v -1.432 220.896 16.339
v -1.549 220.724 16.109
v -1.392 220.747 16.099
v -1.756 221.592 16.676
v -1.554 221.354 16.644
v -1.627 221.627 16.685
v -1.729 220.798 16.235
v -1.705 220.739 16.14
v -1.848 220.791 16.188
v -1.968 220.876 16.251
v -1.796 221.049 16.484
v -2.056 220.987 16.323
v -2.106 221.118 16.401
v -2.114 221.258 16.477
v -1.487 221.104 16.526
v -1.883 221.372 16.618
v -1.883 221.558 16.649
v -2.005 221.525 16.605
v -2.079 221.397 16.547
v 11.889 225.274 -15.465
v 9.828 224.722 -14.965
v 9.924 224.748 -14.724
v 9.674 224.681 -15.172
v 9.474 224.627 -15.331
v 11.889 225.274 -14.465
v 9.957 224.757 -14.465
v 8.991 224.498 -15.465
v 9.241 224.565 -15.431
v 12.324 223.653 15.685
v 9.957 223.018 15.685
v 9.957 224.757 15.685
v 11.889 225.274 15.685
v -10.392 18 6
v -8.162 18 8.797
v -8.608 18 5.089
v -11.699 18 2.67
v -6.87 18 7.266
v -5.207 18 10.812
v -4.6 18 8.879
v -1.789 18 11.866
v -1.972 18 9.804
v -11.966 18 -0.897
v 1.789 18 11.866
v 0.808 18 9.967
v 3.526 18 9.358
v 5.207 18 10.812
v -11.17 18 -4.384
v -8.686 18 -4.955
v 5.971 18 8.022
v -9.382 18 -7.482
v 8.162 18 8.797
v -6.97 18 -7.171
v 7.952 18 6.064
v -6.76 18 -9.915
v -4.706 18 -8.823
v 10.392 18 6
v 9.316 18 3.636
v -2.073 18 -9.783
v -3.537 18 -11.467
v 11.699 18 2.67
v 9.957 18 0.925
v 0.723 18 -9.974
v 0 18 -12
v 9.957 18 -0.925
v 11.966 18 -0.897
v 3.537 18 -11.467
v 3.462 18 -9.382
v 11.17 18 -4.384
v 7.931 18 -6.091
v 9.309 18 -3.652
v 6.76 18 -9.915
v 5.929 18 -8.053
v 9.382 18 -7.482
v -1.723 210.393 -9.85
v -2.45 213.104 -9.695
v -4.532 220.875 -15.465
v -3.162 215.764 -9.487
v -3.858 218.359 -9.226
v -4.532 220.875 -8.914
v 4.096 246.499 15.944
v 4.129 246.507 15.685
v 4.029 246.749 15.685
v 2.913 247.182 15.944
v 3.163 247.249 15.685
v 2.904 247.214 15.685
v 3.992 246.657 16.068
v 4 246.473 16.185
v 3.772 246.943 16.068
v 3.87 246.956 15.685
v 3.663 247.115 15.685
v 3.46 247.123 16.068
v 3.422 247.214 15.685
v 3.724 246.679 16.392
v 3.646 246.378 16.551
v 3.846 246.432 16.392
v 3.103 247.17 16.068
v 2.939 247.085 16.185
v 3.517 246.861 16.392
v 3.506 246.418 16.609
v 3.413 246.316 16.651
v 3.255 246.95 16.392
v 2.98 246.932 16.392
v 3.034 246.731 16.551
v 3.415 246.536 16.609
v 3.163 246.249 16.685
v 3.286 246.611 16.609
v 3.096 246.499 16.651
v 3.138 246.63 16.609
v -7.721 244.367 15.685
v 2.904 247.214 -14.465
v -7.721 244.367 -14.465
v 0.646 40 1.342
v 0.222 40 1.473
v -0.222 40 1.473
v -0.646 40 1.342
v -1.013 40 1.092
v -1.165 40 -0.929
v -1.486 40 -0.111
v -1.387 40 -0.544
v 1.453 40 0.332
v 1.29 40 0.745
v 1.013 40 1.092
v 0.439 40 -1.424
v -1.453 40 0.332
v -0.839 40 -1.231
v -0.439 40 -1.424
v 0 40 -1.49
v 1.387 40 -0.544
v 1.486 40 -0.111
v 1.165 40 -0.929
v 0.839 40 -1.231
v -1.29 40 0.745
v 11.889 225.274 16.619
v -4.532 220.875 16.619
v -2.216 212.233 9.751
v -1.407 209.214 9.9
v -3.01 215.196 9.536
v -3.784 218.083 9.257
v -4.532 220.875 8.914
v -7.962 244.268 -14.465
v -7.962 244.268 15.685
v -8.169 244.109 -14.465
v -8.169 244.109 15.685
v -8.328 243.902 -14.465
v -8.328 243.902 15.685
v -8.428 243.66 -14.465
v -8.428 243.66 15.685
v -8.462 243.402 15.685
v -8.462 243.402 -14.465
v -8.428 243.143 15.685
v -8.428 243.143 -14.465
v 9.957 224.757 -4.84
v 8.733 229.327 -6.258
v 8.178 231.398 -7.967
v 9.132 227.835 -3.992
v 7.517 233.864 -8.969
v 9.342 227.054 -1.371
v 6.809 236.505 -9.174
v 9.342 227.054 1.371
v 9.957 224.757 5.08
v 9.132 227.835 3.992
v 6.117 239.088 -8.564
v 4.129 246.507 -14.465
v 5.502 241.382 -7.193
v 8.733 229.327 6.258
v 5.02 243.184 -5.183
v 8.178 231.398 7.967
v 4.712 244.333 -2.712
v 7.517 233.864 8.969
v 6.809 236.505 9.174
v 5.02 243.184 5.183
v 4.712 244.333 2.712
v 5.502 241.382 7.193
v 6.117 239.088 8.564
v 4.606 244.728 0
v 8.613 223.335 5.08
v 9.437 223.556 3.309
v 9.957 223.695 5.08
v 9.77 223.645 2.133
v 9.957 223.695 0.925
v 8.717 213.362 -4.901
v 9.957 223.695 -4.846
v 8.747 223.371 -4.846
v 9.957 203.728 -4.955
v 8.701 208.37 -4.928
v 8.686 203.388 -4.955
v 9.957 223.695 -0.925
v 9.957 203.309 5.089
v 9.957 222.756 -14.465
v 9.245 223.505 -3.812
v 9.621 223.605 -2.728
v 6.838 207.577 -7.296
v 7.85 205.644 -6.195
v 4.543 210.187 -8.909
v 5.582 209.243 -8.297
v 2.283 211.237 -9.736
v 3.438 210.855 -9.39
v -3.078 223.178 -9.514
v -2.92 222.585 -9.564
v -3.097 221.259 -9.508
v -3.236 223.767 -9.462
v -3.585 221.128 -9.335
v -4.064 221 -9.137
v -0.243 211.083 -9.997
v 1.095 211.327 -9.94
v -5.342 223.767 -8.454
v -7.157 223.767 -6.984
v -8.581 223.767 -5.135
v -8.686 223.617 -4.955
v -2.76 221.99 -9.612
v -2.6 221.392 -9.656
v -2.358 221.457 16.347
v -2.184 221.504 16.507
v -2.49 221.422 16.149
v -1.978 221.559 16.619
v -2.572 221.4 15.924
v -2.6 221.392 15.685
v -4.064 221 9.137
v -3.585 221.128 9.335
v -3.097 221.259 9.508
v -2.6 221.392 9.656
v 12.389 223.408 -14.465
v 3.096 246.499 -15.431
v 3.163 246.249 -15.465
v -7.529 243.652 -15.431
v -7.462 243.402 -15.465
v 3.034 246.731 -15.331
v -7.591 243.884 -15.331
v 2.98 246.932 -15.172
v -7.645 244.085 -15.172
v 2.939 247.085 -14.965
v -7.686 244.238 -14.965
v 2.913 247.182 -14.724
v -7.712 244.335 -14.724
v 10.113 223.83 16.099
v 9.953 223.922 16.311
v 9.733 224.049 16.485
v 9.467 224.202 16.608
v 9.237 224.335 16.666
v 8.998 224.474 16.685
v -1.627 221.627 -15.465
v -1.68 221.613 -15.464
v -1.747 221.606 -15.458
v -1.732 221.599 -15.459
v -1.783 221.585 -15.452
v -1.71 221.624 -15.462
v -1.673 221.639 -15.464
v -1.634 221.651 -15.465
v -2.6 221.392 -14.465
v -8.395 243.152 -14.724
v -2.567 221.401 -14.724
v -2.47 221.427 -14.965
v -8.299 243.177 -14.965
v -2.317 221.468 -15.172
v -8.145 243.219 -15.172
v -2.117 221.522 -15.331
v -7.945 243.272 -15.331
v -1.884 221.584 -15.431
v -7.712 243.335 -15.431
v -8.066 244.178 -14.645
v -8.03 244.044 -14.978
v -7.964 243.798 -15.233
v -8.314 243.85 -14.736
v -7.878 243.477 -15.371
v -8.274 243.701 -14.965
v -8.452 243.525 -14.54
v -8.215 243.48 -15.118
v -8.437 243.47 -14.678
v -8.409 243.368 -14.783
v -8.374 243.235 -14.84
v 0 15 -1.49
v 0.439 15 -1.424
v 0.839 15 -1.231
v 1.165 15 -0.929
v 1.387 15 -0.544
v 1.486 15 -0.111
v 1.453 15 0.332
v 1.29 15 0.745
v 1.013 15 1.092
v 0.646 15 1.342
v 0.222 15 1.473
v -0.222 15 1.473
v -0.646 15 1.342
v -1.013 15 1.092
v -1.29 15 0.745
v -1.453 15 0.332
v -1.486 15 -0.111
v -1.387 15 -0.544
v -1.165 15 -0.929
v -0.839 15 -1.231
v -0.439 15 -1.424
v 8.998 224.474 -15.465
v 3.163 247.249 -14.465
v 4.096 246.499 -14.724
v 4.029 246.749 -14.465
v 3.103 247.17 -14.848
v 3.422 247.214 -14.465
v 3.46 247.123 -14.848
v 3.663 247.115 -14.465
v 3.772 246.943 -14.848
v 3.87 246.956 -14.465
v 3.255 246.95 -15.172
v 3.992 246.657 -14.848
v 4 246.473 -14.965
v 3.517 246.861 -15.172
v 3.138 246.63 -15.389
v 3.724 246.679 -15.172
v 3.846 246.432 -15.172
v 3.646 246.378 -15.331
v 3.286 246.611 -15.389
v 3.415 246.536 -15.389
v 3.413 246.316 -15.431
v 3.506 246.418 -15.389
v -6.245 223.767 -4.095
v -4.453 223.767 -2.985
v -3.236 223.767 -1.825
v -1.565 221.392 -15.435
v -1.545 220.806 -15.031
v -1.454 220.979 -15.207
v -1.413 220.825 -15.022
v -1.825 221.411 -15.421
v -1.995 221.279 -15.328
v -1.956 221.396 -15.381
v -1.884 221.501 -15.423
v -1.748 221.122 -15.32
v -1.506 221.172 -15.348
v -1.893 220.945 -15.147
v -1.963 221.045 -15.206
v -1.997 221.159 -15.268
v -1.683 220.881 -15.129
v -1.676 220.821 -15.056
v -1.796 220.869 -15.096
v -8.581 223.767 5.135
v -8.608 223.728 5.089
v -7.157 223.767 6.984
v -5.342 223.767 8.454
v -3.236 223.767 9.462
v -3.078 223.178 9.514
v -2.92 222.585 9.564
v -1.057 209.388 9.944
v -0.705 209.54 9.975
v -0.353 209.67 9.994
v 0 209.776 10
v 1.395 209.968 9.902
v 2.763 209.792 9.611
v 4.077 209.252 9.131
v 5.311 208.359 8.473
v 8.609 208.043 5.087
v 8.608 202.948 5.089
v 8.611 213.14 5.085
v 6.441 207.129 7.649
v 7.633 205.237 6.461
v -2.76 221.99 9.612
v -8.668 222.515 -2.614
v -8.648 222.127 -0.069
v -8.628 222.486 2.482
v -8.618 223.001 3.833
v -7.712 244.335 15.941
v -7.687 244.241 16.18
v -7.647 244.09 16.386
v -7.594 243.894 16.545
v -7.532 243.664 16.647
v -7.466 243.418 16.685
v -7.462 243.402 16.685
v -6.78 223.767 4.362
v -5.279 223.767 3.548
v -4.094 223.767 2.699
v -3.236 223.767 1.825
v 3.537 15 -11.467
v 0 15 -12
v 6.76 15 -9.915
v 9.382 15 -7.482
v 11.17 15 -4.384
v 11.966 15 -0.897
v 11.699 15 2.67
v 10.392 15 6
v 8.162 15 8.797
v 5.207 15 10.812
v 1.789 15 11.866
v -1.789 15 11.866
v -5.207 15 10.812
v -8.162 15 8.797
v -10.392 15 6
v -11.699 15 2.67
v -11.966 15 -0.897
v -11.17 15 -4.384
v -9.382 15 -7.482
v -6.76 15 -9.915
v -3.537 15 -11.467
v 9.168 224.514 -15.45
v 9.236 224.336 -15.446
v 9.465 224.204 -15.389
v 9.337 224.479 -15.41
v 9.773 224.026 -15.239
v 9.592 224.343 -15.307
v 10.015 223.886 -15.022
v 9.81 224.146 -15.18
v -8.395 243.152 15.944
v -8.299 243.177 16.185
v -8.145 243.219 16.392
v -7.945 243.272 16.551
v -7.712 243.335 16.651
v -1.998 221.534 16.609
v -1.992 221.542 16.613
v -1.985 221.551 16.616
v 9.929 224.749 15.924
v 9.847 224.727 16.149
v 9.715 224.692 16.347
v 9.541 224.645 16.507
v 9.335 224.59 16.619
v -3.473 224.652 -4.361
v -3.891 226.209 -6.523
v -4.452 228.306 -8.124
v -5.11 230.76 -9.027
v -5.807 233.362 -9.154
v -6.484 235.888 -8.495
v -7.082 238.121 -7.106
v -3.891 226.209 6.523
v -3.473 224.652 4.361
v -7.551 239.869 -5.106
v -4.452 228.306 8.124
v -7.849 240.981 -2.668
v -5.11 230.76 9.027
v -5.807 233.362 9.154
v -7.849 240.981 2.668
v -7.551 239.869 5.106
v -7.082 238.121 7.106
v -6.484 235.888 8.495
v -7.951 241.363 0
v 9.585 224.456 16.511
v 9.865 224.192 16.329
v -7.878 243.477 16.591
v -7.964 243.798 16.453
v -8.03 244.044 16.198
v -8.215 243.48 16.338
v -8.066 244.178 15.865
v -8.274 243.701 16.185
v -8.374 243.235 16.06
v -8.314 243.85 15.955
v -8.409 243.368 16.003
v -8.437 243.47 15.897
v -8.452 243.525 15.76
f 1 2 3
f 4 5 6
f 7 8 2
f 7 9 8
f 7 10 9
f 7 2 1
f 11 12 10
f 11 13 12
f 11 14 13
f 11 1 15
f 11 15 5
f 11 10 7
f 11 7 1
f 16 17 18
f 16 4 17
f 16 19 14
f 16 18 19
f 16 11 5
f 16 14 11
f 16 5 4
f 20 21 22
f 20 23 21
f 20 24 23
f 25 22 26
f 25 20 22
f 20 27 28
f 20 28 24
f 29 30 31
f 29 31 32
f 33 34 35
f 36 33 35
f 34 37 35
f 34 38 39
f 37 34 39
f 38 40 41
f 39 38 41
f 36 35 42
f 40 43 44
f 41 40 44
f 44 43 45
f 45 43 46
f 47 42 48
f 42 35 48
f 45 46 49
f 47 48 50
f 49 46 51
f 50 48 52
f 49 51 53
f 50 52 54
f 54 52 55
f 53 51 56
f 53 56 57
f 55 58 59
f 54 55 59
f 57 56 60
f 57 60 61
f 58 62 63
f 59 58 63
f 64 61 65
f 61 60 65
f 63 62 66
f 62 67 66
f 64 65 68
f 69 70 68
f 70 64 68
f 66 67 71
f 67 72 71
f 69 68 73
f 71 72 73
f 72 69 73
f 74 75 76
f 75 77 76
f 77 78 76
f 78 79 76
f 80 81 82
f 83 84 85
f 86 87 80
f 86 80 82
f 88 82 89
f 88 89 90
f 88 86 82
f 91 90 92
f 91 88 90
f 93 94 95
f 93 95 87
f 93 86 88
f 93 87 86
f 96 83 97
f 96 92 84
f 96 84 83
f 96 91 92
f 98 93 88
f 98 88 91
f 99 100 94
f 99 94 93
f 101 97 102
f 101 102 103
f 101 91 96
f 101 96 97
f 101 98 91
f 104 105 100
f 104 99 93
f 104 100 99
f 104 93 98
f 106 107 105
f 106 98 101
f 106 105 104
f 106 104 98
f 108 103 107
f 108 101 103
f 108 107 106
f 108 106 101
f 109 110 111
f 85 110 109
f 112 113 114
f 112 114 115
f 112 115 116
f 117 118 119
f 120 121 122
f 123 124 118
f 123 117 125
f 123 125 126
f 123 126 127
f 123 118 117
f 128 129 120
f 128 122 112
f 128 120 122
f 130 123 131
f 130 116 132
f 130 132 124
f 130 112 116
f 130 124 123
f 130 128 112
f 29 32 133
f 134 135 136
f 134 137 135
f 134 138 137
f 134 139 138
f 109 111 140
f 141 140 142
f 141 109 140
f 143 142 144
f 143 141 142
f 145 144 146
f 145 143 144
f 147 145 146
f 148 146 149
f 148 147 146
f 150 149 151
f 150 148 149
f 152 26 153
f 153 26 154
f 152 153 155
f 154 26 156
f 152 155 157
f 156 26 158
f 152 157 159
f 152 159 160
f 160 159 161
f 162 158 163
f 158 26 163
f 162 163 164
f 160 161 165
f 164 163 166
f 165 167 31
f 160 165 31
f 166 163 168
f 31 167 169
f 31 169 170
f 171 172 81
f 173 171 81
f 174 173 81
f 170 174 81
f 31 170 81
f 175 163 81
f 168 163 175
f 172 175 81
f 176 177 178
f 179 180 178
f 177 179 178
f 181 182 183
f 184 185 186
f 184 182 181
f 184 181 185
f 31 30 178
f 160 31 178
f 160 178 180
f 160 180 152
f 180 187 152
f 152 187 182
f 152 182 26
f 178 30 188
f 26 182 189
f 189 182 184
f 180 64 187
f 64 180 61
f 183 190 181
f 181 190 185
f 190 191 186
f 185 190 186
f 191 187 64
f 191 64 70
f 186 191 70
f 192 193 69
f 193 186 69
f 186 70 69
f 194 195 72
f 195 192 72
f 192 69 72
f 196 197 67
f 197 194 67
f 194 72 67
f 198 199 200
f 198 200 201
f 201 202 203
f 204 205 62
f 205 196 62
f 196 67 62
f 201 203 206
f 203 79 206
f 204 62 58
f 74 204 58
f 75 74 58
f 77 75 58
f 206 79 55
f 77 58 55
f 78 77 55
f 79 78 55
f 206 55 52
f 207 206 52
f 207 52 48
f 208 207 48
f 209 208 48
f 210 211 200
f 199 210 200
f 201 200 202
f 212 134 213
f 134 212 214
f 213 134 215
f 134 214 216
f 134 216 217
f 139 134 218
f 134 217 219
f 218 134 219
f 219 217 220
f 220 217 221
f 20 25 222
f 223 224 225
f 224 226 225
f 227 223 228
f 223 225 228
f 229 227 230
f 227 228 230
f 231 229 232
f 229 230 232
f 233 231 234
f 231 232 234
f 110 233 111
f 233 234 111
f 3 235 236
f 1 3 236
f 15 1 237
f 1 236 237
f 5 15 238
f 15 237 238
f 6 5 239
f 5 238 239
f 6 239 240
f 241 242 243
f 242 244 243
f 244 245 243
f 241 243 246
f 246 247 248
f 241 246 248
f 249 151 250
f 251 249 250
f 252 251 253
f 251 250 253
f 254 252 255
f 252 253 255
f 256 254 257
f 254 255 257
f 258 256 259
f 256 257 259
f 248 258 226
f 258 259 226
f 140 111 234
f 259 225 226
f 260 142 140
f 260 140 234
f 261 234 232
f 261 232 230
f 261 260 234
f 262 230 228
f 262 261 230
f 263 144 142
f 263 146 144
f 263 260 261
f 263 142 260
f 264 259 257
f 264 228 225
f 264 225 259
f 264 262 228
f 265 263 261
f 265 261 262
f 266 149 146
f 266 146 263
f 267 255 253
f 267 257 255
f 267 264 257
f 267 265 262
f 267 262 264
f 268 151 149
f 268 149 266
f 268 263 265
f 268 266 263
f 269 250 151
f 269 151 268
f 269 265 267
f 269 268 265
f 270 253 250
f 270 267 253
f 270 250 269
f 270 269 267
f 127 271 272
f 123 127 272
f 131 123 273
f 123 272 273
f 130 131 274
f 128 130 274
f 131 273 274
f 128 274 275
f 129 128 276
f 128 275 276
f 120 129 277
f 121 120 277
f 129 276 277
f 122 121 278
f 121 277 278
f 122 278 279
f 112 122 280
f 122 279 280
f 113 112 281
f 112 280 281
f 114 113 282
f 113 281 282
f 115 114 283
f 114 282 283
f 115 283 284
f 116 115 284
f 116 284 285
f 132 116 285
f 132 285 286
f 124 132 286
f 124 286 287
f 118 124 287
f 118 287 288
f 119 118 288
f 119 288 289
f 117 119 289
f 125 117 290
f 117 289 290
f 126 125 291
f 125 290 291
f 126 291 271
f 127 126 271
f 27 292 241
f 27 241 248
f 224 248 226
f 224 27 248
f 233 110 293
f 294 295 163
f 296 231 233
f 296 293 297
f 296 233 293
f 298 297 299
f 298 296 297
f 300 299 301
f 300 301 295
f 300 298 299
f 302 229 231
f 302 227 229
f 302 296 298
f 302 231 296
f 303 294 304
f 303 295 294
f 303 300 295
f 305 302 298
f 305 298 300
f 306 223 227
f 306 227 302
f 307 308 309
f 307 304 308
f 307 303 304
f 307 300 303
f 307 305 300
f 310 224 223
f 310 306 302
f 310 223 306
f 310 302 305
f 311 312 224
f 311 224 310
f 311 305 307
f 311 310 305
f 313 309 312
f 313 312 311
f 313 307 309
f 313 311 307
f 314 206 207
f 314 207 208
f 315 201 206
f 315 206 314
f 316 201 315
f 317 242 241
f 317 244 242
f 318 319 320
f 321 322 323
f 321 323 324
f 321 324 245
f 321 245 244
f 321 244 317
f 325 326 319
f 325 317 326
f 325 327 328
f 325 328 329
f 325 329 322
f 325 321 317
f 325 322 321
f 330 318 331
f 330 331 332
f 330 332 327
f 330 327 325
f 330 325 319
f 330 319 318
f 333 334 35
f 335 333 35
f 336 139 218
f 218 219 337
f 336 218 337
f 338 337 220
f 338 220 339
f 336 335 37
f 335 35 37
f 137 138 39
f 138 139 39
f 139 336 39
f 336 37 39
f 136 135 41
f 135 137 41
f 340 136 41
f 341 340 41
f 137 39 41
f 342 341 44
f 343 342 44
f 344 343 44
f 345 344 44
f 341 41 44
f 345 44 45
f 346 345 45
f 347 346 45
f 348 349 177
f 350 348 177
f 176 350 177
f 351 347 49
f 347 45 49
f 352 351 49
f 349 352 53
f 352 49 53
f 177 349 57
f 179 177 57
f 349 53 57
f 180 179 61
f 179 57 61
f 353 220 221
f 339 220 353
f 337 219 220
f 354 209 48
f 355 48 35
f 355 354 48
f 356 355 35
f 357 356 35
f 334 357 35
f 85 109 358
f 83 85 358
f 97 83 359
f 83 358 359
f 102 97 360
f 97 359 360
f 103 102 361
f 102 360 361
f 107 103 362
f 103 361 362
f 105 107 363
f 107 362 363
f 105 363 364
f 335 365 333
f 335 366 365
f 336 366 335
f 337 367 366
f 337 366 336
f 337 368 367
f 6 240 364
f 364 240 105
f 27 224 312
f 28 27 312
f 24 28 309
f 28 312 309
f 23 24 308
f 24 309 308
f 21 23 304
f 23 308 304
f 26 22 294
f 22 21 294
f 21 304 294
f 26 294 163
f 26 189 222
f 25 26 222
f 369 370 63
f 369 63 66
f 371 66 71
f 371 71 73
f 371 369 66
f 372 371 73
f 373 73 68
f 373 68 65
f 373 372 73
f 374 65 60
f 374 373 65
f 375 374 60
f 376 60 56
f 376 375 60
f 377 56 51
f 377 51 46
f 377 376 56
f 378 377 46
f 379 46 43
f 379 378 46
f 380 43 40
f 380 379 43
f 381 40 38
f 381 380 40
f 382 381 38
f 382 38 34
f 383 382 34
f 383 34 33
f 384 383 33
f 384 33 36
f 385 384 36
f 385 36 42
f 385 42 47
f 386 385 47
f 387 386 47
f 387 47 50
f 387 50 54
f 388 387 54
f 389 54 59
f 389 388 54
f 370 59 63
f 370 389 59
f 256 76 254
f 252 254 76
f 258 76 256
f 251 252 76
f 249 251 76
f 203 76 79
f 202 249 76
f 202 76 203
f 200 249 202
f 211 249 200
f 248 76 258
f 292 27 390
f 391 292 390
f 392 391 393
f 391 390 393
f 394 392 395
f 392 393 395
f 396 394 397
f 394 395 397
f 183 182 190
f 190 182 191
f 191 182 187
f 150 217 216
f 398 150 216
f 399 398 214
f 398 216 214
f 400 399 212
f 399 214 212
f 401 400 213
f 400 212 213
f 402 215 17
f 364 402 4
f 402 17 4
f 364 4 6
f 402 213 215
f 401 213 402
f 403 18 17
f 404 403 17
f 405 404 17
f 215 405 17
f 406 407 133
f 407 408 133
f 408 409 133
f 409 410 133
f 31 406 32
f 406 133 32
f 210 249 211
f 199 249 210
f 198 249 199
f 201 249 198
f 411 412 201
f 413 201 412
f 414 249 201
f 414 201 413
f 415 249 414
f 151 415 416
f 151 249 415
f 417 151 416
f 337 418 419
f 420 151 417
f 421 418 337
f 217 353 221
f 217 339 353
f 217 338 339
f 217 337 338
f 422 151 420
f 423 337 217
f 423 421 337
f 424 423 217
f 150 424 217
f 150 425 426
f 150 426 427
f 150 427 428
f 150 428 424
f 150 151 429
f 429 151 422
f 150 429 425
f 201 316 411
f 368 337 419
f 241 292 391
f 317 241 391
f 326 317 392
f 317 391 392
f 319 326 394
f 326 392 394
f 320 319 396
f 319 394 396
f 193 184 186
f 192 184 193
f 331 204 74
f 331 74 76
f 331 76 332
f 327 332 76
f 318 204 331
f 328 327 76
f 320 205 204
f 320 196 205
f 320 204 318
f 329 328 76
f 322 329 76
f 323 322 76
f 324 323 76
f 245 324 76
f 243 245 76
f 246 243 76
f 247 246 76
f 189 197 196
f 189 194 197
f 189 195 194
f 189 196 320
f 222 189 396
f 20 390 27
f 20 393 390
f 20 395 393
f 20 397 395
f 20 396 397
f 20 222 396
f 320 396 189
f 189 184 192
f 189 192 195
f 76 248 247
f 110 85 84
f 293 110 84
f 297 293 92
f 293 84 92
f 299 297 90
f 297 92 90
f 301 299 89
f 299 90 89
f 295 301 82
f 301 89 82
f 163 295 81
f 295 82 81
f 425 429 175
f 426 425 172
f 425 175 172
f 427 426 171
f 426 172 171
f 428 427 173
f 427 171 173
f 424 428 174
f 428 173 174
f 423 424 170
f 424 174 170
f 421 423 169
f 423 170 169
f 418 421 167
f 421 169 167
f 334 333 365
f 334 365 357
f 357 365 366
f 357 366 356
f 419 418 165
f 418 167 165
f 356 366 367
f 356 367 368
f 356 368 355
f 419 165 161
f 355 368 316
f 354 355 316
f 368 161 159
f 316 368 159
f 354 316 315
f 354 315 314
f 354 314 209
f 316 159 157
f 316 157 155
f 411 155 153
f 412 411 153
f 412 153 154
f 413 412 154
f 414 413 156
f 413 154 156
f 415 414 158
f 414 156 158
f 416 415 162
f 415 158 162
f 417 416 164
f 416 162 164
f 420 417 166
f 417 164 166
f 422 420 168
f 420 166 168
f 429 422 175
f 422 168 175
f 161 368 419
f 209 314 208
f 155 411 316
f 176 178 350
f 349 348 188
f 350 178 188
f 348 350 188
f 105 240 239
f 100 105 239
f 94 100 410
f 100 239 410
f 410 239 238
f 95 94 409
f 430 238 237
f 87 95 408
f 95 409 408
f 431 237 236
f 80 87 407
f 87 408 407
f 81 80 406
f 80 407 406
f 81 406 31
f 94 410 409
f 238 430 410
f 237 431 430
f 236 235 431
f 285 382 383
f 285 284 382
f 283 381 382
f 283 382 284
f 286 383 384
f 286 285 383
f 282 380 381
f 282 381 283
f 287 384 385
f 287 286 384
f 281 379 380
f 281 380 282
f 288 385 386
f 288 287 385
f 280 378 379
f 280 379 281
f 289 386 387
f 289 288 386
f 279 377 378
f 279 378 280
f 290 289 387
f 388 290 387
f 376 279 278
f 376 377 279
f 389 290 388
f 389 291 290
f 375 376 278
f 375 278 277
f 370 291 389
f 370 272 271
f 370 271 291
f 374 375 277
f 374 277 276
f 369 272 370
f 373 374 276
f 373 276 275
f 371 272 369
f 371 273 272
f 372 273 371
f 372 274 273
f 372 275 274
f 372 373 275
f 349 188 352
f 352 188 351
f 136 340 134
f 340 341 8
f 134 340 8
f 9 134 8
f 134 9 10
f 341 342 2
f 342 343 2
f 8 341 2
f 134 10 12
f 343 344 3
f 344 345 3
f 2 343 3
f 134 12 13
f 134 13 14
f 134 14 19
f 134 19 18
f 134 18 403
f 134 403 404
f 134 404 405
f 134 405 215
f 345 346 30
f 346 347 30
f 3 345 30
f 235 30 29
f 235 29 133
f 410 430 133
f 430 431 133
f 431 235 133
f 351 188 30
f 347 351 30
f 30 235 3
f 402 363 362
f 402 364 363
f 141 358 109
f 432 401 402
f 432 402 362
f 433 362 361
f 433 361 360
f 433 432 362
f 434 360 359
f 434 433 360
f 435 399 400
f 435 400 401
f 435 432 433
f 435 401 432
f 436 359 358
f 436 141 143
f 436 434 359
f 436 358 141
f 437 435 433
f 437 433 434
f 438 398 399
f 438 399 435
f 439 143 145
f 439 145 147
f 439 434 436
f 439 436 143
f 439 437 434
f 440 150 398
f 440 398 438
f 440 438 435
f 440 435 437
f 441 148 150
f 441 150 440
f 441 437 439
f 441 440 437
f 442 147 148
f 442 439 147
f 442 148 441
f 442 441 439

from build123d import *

# Parameters (mm, degrees)
SKETCH_1_R               = 15
SKETCH_1_R_2             = 10
SKETCH_1_R_3             = 1.070370935
EXTRUDE_2_DEPTH          = 3
EXTRUDE_7_DEPTH          = 220.766502815
EXTRUDE_7_DEPTH_BACK     = 3
SKETCH_3_R               = 10
SKETCH_6_W               = 32.150004278
SKETCH_6_H               = 24.543060803
EXTRUDE_8_DEPTH          = 13
SKETCH_7_R               = 9.2
CUT_EXTRUDE_1_DEPTH      = 44
CUT_EXTRUDE_2_DEPTH      = 218
FILLET_1_R               = 1
FILLET_2_R               = 1
FILLET_3_R               = 1
EXTRUDE_9_DEPTH          = 15
EXTRUDE_9_DEPTH_BACK     = 2
SKETCH_10_W              = 8.615383554
SKETCH_10_H              = 30.150004278
CUT_EXTRUDE_3_DEPTH      = 265
CUT_EXTRUDE_4_DEPTH      = 10
CUT_EXTRUDE_4_DEPTH_BACK = 111
SKETCH_12_W              = 40.878647102
SKETCH_12_H              = 15
SKETCH_13_R              = 12
EXTRUDE_10_DEPTH         = 3
SKETCH_14_R              = 1.49
CUT_EXTRUDE_5_DEPTH      = 25


with BuildPart() as part:
    # 草图1 → 凸台-拉伸2 (new body)
    with BuildSketch(Plane(origin=(0, 0, 0), x_dir=(1, 0, 0), z_dir=(0, 1, 0))):
        with Locations(Location((0, 0, 0), (0, 0, 270))):
            Circle(SKETCH_1_R)
        with Locations(Location((0, 0, 0), (0, 0, 270))):
            Circle(SKETCH_1_R_2, mode=Mode.SUBTRACT)
        with Locations(Location((12, 0, 0), (0, 0, 270))):
            Circle(SKETCH_1_R_3, mode=Mode.SUBTRACT)
        with Locations(Location((-12, 0, 0), (0, 0, 270))):
            Circle(SKETCH_1_R_3, mode=Mode.SUBTRACT)
        with Locations(Location((0, 12, 0), (0, 0, 270))):
            Circle(SKETCH_1_R_3, mode=Mode.SUBTRACT)
        with Locations(Location((0, -12, 0), (0, 0, 270))):
            Circle(SKETCH_1_R_3, mode=Mode.SUBTRACT)
    extrude(amount=EXTRUDE_2_DEPTH)

    # 草图3 → 凸台-拉伸7 (add, two sides: drawn at the far end of the back side and taken through both)
    with BuildSketch(Plane(origin=(0, 3, 0), x_dir=(1, 0, 0), z_dir=(0, 1, 0)).offset(-EXTRUDE_7_DEPTH_BACK)):
        with Locations(Location((0, 0, 0), (0, 0, 270))):
            Circle(SKETCH_3_R)
    extrude(amount=EXTRUDE_7_DEPTH + EXTRUDE_7_DEPTH_BACK)

    # 草图6 → 凸台-拉伸8 (add)
    with BuildSketch(Plane(origin=(65.479343136, 17.545137114, 0), x_dir=(0, 0, 1), z_dir=(-0.9659258262890673, -0.25881904510252474, 0))):
        with Locations((0.609852797, 225.767598204)):
            Rectangle(SKETCH_6_W, SKETCH_6_H)
    extrude(amount=EXTRUDE_8_DEPTH)

    # 草图7 → 切除-拉伸1 (cut)
    with BuildSketch(Plane(origin=(65.479343136, 17.545137114, 0), x_dir=(0, 0, -1), z_dir=(0.9659258262890673, 0.25881904510252474, 0))):
        with Locations(Location((0, 225.99664207, 0), (0, 0, 90))):
            Circle(SKETCH_7_R)
    extrude(amount=-CUT_EXTRUDE_1_DEPTH, mode=Mode.SUBTRACT)

    # 草图8 → 切除-拉伸2 (cut)
    with BuildSketch(Plane(origin=(0, 223.766502815, 0), x_dir=(1, 0, 0), z_dir=(0, 1, 0))):
        Polygon((-8.686752569, 5.062170738), (-8.608116415, -5.089236857), (-12.71958383, -5.121085641), (-12.798219984, 5.030321955), align=None)
    extrude(amount=-CUT_EXTRUDE_2_DEPTH, mode=Mode.SUBTRACT)

    # 圆角1
    fillet_1_edges = [part.edges().sort_by_distance(p)[0] for p in [
        (-2.408234698, 245.790955307, -15.465149342),
        (3.870283173, 247.473279101, 0.609852797),
        (-2.408234698, 245.790955307, 16.684854936),
        (-8.686752569, 244.108631514, 0.609852797),
    ]]
    fillet(fillet_1_edges, radius=FILLET_1_R)

    # 圆角2
    # the kernel refuses this fillet: 1 mm, written as the material it takes off along each edge
    with BuildSketch(Plane(origin=(3.163176392, 246.248534229, -14.465149342), x_dir=(0.9659258262890673, 0.25881904510252474, 0), z_dir=(0, 0, -1))) as fillet_2_piece_1_section:
        Polygon((0, 0), (FILLET_2_R * 1.02, 0), (FILLET_2_R * 1.02, -FILLET_2_R * 1.02), (0, -FILLET_2_R * 1.02), align=None)
    fillet_2_piece_1 = extrude(amount=FILLET_2_R * 1.02, mode=Mode.PRIVATE)
    fillet_2_piece_1 = fillet_2_piece_1 - Plane(origin=(3.163176392, 246.248534229, -14.465149342), x_dir=(-0.49999999999999645, -0.8660254037844407, 0), z_dir=(0, 0, -1)) * Sphere(FILLET_2_R, mode=Mode.PRIVATE)
    add(fillet_2_piece_1, mode=Mode.SUBTRACT)
    with BuildSketch(Plane(origin=(-7.462007697, 243.401524733, -14.465149342), x_dir=(0, 0, -1), z_dir=(-0.9659258262890673, -0.25881904510252474, 0))) as fillet_2_piece_2_section:
        Polygon((0, 0), (FILLET_2_R * 1.02, 0), (FILLET_2_R * 1.02, -FILLET_2_R * 1.02), (0, -FILLET_2_R * 1.02), align=None)
    fillet_2_piece_2 = extrude(amount=FILLET_2_R * 1.02, mode=Mode.PRIVATE)
    fillet_2_piece_2 = fillet_2_piece_2 - Plane(origin=(-7.462007697, 243.401524733, -14.465149342), x_dir=(0.1830127018922222, -0.6830127018922186, 0.7071067811865475), z_dir=(-0.9659258262890673, -0.25881904510252474, 0)) * Sphere(FILLET_2_R, mode=Mode.PRIVATE)
    add(fillet_2_piece_2, mode=Mode.SUBTRACT)
    with BuildSketch(Plane(origin=(-7.462007697, 243.401524733, 15.684854936), x_dir=(0, 0, 1), z_dir=(-0.9659258262890673, -0.25881904510252474, 0))) as fillet_2_piece_3_section:
        Polygon((0, 0), (FILLET_2_R * 1.02, 0), (FILLET_2_R * 1.02, FILLET_2_R * 1.02), (0, FILLET_2_R * 1.02), align=None)
    fillet_2_piece_3 = extrude(amount=FILLET_2_R * 1.02, mode=Mode.PRIVATE)
    fillet_2_piece_3 = fillet_2_piece_3 - Plane(origin=(-7.462007697, 243.401524733, 15.684854936), x_dir=(0.18301270189222205, -0.6830127018922186, -0.7071067811865475), z_dir=(-0.9659258262890673, -0.25881904510252474, 0)) * Sphere(FILLET_2_R, mode=Mode.PRIVATE)
    add(fillet_2_piece_3, mode=Mode.SUBTRACT)
    with BuildSketch(Plane(origin=(3.163176392, 246.248534229, 15.684854936), x_dir=(0.9659258262890673, 0.25881904510252474, 0), z_dir=(0, 0, 1))) as fillet_2_piece_4_section:
        Polygon((0, 0), (FILLET_2_R * 1.02, 0), (FILLET_2_R * 1.02, FILLET_2_R * 1.02), (0, FILLET_2_R * 1.02), align=None)
    fillet_2_piece_4 = extrude(amount=FILLET_2_R * 1.02, mode=Mode.PRIVATE)
    fillet_2_piece_4 = fillet_2_piece_4 - Plane(origin=(3.163176392, 246.248534229, 15.684854936), x_dir=(-0.49999999999999645, -0.8660254037844407, 0), z_dir=(0, 0, 1)) * Sphere(FILLET_2_R, mode=Mode.PRIVATE)
    add(fillet_2_piece_4, mode=Mode.SUBTRACT)
    with BuildSketch(Plane(origin=(-1.627434227, 221.6266001, 15.684854936), x_dir=(0, 0, 1), z_dir=(-0.9659258262890673, -0.25881904510252474, 0))) as fillet_2_piece_5_section:
        Polygon((0, 0), (FILLET_2_R * 1.02, 0), (FILLET_2_R * 1.02, -FILLET_2_R * 1.02), (0, -FILLET_2_R * 1.02), align=None)
    fillet_2_piece_5 = extrude(amount=FILLET_2_R * 1.02, mode=Mode.PRIVATE)
    fillet_2_piece_5 = fillet_2_piece_5 - Plane(origin=(-1.627434227, 221.6266001, 15.684854936), x_dir=(-0.1830127018922222, 0.6830127018922186, -0.7071067811865475), z_dir=(-0.9659258262890673, -0.25881904510252474, 0)) * Sphere(FILLET_2_R, mode=Mode.PRIVATE)
    add(fillet_2_piece_5, mode=Mode.SUBTRACT)
    with BuildSketch(Plane(origin=(12.6373093, 224.413550428, -15.465149342), x_dir=(0, 0, 1), z_dir=(-0.9659258262890673, -0.25881904510252474, 0))) as fillet_2_piece_6:
        with BuildLine():
            CenterArc((FILLET_2_R, FILLET_2_R), FILLET_2_R, 180, 90)
            Line((0, FILLET_2_R), (0, 0))
            Line((0, 0), (FILLET_2_R, 0))
        make_face()
    extrude(amount=18, mode=Mode.SUBTRACT)
    with BuildSketch(Plane(origin=(4.129102218, 246.507353274, -15.465149342), x_dir=(-0.9659258262890672, -0.2588190451025247, 0), z_dir=(0.25881904510252474, -0.9659258262890673, 0)), Plane(origin=(-8.427933524, 243.142705688, -15.465149342), x_dir=(0, 0, 1), z_dir=(0.25881904510252474, -0.9659258262890673, 0)), Plane(origin=(10.869542347, 221.35168825, 16.684854936), x_dir=(-0.9659258262890672, -0.2588190451025247, 0), z_dir=(-0.25881904510252474, 0.9659258262890673, 0))) as fillet_2_piece_7:
        with BuildLine():
            CenterArc((FILLET_2_R, -FILLET_2_R), FILLET_2_R, 90, 90)
            Line((0, -FILLET_2_R), (0, 0))
            Line((0, 0), (FILLET_2_R, 0))
        make_face()
    extrude(amount=26.043060803, mode=Mode.SUBTRACT)
    with BuildSketch(Plane(origin=(12.6373093, 224.413550428, 16.684854936), x_dir=(-0.2588190451025247, 0.9659258262890672, 0), z_dir=(-0.9659258262890673, -0.25881904510252474, 0))) as fillet_2_piece_8:
        with BuildLine():
            CenterArc((FILLET_2_R, FILLET_2_R), FILLET_2_R, 180, 90)
            Line((0, FILLET_2_R), (0, 0))
            Line((0, 0), (FILLET_2_R, 0))
        make_face()
    extrude(amount=14.5, mode=Mode.SUBTRACT)
    with BuildSketch(Plane(origin=(-2.593360053, 221.367781055, 16.684854936), x_dir=(0, 0, -1), z_dir=(-0.25881904510252474, 0.9659258262890673, 0))) as fillet_2_piece_9:
        with BuildLine():
            CenterArc((FILLET_2_R, -FILLET_2_R), FILLET_2_R, 90, 90)
            Line((0, -FILLET_2_R), (0, 0))
            Line((0, 0), (FILLET_2_R, 0))
        make_face()
    extrude(amount=22.543060803, mode=Mode.SUBTRACT)
    with BuildSketch(Plane(origin=(-2.334541008, 220.401855229, 7.223678228), x_dir=(-0.2588190451025276, 0.9659258262890665, 0), z_dir=(0, 0, 1))) as fillet_2_piece_10_section:
        with BuildLine():
            CenterArc((FILLET_2_R, -FILLET_2_R), FILLET_2_R, 90, 90)
            Line((0, -FILLET_2_R), (0, 0))
            Line((0, 0), (FILLET_2_R, 0))
        make_face()
    fillet_2_piece_10 = extrude(amount=8.461176708, mode=Mode.PRIVATE)
    fillet_2_piece_10 = fillet_2_piece_10 - Plane(origin=(0, 220.67611038, 0), x_dir=(0, 0, 1), z_dir=(0, -1, 0)) * Cylinder(10, 21, mode=Mode.PRIVATE)
    add(fillet_2_piece_10, mode=Mode.SUBTRACT)

    # 圆角3
    # the kernel refuses this fillet: 1 mm, written as the material it takes off along each edge
    with BuildSketch(Plane(origin=(-1.627434227, 221.6266001, -14.465149342), x_dir=(0.25881904510252474, -0.9659258262890673, 0), z_dir=(-0.9659258262890673, -0.25881904510252474, 0))) as fillet_3_piece_1_section:
        Polygon((0, 0), (FILLET_3_R, 0), (FILLET_3_R, -FILLET_3_R), (0, -FILLET_3_R), align=None)
    fillet_3_piece_1 = extrude(amount=FILLET_3_R, mode=Mode.PRIVATE)
    fillet_3_piece_1 = fillet_3_piece_1 - Plane(origin=(-1.627434227, 221.6266001, -14.465149342), x_dir=(-0.18301270189222205, 0.6830127018922186, 0.7071067811865475), z_dir=(-0.9659258262890673, -0.25881904510252474, 0)) * Sphere(FILLET_3_R, mode=Mode.PRIVATE)
    add(fillet_3_piece_1, mode=Mode.SUBTRACT)
    with BuildSketch(Plane(origin=(-2.334541008, 220.401855229, -14.465149342), x_dir=(-0.2588190451025293, 0.9659258262890661, 0), z_dir=(0, 0, 1))) as fillet_3_piece_2_section:
        with BuildLine():
            CenterArc((FILLET_3_R, -FILLET_3_R), FILLET_3_R, 90, 90)
            Line((0, -FILLET_3_R), (0, 0))
            Line((0, 0), (FILLET_3_R, 0))
        make_face()
    fillet_3_piece_2 = extrude(amount=7.241471114, mode=Mode.PRIVATE)
    fillet_3_piece_2 = fillet_3_piece_2 - Plane(origin=(0, 220.680283856, 0), x_dir=(0, 0, 1), z_dir=(0, -1, 0)) * Cylinder(10, 19, mode=Mode.PRIVATE)
    add(fillet_3_piece_2, mode=Mode.SUBTRACT)

    # 草图9 → 凸台-拉伸9 (add, two sides: drawn at the far end of the back side and taken through both)
    with BuildSketch(Plane(origin=(65.479343136, 17.545137114, 0), x_dir=(0, 0, 1), z_dir=(-0.9659258262890673, -0.25881904510252474, 0)).offset(-EXTRUDE_9_DEPTH_BACK)):
        Polygon((-15.465149342, 214.521357737), (-4.839983079, 214.521357737), (-4.955271508, 194.209196023), align=None)
        Polygon((16.619377138, 214.521357737), (5.079909852, 214.521357737), (5.089236857, 193.804302434), align=None)
    extrude(amount=EXTRUDE_9_DEPTH + EXTRUDE_9_DEPTH_BACK)

    # 草图10 → 切除-拉伸3 (cut)
    with BuildSketch(Plane(origin=(0, 3, 0), x_dir=(1, 0, 0), z_dir=(0, 1, 0))):
        with Locations((14.264821949, -0.609852797)):
            Rectangle(SKETCH_10_W, SKETCH_10_H)
    extrude(amount=CUT_EXTRUDE_3_DEPTH, mode=Mode.SUBTRACT)

    # 草图12 → 切除-拉伸4 (cut, two sides: drawn at the far end of the back side and taken through both)
    with BuildSketch(Plane(origin=(-8.647020453, 0, 0.066982674), x_dir=(0.007746097662068172, 0, 0.999969998535461), z_dir=(-0.999969998535461, 0, 0.007746097662068172)).offset(-CUT_EXTRUDE_4_DEPTH_BACK)):
        with Locations((1.109642623, 7.5)):
            Rectangle(SKETCH_12_W, SKETCH_12_H)
    extrude(amount=CUT_EXTRUDE_4_DEPTH + CUT_EXTRUDE_4_DEPTH_BACK, mode=Mode.SUBTRACT)

    # 草图13 → 凸台-拉伸10 (add)
    with BuildSketch(Plane.XZ.offset(-15)):
        with Locations(Location((0, 0, 0), (0, 0, 270))):
            Circle(SKETCH_13_R)
    extrude(amount=-EXTRUDE_10_DEPTH)

    # 草图14 → 切除-拉伸5 (cut)
    with BuildSketch(Plane(origin=(0, 15, 0), x_dir=(-1, 0, 0), z_dir=(0, -1, 0))):
        with Locations(Location((0, 0, 0), (0, 0, 90))):
            Circle(SKETCH_14_R)
    extrude(amount=-CUT_EXTRUDE_5_DEPTH, mode=Mode.SUBTRACT)


solid = part.part
